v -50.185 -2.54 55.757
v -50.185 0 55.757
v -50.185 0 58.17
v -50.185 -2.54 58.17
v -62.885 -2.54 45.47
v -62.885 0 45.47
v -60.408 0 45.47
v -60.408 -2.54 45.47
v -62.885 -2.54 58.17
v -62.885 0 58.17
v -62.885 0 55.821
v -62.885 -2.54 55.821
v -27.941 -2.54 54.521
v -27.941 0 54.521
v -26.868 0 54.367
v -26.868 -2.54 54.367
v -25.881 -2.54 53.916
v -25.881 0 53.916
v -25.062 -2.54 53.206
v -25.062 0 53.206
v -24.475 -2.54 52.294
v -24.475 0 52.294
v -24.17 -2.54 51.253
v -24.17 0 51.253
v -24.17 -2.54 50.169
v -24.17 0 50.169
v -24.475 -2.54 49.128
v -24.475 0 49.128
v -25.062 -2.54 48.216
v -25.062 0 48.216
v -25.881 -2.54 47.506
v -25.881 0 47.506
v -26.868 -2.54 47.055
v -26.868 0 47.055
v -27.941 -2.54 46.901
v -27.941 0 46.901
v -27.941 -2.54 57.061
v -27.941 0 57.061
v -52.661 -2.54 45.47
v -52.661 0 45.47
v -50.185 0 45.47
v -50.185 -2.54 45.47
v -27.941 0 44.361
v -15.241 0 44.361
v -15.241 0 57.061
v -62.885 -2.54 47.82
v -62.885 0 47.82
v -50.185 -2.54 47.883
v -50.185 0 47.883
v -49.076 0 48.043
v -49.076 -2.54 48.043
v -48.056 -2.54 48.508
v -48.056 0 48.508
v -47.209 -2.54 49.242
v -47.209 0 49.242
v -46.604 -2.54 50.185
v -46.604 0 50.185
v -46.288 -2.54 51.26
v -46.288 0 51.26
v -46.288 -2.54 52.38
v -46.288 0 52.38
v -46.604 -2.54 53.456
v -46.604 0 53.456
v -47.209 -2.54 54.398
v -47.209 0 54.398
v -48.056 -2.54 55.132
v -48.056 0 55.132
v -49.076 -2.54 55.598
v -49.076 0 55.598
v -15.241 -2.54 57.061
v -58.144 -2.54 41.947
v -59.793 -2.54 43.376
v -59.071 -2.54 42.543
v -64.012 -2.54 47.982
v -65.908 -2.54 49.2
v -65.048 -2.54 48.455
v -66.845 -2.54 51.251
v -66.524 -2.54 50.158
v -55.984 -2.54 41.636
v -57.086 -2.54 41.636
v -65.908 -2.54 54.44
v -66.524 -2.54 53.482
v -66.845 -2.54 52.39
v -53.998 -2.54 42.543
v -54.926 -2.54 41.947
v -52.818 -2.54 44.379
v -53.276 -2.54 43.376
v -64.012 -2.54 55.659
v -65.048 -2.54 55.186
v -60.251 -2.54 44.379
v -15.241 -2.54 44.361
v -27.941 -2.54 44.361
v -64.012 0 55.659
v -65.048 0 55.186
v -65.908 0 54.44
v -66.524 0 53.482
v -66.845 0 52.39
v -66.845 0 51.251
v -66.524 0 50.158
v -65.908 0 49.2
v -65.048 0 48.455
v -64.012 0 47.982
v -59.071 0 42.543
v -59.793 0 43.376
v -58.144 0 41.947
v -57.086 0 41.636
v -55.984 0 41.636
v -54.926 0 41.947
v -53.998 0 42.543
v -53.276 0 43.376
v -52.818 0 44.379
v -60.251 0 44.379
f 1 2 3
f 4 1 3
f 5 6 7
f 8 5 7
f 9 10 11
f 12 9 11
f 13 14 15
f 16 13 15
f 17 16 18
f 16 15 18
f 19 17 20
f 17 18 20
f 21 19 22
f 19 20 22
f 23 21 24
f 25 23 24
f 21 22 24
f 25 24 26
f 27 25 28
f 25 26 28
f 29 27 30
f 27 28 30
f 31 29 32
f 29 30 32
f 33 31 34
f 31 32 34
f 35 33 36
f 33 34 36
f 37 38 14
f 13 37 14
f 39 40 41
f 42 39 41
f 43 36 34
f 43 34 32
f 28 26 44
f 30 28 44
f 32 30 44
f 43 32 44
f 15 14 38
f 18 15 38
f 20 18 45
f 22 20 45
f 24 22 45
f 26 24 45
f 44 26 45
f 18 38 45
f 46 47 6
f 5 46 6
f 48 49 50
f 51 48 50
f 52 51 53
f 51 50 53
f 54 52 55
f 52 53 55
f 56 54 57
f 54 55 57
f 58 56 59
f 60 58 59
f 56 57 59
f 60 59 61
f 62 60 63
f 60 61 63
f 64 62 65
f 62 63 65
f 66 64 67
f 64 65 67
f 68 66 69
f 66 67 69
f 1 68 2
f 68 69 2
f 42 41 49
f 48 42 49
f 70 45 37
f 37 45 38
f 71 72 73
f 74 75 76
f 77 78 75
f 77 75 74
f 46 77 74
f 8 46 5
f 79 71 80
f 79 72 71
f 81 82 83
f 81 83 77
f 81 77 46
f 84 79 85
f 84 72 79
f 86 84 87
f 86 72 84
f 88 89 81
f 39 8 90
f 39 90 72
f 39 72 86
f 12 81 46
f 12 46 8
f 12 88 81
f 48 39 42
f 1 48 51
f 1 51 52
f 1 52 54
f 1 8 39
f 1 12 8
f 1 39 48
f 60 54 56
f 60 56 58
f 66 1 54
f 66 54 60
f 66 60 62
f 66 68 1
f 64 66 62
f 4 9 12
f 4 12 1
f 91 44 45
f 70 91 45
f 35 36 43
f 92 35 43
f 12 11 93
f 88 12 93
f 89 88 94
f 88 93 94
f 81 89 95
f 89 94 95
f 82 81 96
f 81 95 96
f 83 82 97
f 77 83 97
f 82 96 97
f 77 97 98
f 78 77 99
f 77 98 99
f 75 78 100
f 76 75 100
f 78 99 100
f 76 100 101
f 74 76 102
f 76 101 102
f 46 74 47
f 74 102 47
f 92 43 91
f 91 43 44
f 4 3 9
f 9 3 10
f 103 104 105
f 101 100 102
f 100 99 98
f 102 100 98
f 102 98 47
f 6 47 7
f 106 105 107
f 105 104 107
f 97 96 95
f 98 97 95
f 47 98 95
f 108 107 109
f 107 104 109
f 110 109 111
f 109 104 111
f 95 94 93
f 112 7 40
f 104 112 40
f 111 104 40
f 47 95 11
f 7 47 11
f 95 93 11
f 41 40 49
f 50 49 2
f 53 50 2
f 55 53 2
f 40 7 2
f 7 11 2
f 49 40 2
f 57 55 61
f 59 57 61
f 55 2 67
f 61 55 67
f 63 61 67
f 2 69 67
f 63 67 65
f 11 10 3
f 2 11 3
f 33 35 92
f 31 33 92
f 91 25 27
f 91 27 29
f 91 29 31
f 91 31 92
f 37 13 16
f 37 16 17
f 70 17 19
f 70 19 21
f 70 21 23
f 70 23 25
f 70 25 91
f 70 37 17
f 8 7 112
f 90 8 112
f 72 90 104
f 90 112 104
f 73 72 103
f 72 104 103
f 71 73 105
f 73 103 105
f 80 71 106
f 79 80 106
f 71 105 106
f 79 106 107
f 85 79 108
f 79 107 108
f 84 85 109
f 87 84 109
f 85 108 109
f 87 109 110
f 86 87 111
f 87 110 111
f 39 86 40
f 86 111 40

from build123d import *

# Parameters (mm, degrees)
F2_DEPTH = 2.54
F3_DEPTH = 2.54


with BuildPart() as f2:
    # F1 (on Front) → F2 (new body)
    with BuildSketch(Plane.XZ):
        with BuildLine():
            Line((-15.241104, 57.060856), (-27.941104, 57.060856))
            Line((-27.941104, 57.060856), (-27.941104, 54.520856))
            ThreePointArc((-27.941104, 54.520856), (-24.131104, 50.710856), (-27.941104, 46.900856))
            Line((-27.941104, 46.900856), (-27.941104, 44.360856))
            Line((-27.941104, 44.360856), (-15.241104, 44.360856))
            Line((-15.241104, 44.360856), (-15.241104, 57.060856))
        make_face()
    extrude(amount=F2_DEPTH)


with BuildPart() as f3:
    # F0 (on Front) → F3 (new body)
    with BuildSketch(Plane.XZ):
        Polygon((-50.184808, 58.170184), (-62.884808, 58.170184), (-62.884808, 55.820684), (-62.884808, 47.819684), (-62.884808, 45.470184), (-60.598808, 45.470184), (-60.408308, 45.470184), (-56.534808, 45.470184), (-52.661308, 45.470184), (-52.470808, 45.470184), (-50.184808, 45.470184), (-50.184808, 47.502184), (-50.184808, 47.883184), (-50.184808, 55.757184), (-50.184808, 56.138184), align=None)
        with BuildLine():
            Line((-62.884808, 47.819684), (-62.884808, 55.820684))
            ThreePointArc((-62.884808, 55.820684), (-66.885308, 51.820184), (-62.884808, 47.819684))
        make_face()
        with BuildLine():
            ThreePointArc((-50.184808, 47.883184), (-46.247808, 51.820184), (-50.184808, 55.757184))
            Line((-50.184808, 55.757184), (-50.184808, 47.883184))
        make_face()
        with BuildLine():
            Line((-56.534808, 45.470184), (-60.408308, 45.470184))
            ThreePointArc((-60.408308, 45.470184), (-56.534808, 41.596684), (-52.661308, 45.470184))
            Line((-52.661308, 45.470184), (-56.534808, 45.470184))
        make_face()
    extrude(amount=F3_DEPTH)


solid = Compound([f2.part, f3.part])
